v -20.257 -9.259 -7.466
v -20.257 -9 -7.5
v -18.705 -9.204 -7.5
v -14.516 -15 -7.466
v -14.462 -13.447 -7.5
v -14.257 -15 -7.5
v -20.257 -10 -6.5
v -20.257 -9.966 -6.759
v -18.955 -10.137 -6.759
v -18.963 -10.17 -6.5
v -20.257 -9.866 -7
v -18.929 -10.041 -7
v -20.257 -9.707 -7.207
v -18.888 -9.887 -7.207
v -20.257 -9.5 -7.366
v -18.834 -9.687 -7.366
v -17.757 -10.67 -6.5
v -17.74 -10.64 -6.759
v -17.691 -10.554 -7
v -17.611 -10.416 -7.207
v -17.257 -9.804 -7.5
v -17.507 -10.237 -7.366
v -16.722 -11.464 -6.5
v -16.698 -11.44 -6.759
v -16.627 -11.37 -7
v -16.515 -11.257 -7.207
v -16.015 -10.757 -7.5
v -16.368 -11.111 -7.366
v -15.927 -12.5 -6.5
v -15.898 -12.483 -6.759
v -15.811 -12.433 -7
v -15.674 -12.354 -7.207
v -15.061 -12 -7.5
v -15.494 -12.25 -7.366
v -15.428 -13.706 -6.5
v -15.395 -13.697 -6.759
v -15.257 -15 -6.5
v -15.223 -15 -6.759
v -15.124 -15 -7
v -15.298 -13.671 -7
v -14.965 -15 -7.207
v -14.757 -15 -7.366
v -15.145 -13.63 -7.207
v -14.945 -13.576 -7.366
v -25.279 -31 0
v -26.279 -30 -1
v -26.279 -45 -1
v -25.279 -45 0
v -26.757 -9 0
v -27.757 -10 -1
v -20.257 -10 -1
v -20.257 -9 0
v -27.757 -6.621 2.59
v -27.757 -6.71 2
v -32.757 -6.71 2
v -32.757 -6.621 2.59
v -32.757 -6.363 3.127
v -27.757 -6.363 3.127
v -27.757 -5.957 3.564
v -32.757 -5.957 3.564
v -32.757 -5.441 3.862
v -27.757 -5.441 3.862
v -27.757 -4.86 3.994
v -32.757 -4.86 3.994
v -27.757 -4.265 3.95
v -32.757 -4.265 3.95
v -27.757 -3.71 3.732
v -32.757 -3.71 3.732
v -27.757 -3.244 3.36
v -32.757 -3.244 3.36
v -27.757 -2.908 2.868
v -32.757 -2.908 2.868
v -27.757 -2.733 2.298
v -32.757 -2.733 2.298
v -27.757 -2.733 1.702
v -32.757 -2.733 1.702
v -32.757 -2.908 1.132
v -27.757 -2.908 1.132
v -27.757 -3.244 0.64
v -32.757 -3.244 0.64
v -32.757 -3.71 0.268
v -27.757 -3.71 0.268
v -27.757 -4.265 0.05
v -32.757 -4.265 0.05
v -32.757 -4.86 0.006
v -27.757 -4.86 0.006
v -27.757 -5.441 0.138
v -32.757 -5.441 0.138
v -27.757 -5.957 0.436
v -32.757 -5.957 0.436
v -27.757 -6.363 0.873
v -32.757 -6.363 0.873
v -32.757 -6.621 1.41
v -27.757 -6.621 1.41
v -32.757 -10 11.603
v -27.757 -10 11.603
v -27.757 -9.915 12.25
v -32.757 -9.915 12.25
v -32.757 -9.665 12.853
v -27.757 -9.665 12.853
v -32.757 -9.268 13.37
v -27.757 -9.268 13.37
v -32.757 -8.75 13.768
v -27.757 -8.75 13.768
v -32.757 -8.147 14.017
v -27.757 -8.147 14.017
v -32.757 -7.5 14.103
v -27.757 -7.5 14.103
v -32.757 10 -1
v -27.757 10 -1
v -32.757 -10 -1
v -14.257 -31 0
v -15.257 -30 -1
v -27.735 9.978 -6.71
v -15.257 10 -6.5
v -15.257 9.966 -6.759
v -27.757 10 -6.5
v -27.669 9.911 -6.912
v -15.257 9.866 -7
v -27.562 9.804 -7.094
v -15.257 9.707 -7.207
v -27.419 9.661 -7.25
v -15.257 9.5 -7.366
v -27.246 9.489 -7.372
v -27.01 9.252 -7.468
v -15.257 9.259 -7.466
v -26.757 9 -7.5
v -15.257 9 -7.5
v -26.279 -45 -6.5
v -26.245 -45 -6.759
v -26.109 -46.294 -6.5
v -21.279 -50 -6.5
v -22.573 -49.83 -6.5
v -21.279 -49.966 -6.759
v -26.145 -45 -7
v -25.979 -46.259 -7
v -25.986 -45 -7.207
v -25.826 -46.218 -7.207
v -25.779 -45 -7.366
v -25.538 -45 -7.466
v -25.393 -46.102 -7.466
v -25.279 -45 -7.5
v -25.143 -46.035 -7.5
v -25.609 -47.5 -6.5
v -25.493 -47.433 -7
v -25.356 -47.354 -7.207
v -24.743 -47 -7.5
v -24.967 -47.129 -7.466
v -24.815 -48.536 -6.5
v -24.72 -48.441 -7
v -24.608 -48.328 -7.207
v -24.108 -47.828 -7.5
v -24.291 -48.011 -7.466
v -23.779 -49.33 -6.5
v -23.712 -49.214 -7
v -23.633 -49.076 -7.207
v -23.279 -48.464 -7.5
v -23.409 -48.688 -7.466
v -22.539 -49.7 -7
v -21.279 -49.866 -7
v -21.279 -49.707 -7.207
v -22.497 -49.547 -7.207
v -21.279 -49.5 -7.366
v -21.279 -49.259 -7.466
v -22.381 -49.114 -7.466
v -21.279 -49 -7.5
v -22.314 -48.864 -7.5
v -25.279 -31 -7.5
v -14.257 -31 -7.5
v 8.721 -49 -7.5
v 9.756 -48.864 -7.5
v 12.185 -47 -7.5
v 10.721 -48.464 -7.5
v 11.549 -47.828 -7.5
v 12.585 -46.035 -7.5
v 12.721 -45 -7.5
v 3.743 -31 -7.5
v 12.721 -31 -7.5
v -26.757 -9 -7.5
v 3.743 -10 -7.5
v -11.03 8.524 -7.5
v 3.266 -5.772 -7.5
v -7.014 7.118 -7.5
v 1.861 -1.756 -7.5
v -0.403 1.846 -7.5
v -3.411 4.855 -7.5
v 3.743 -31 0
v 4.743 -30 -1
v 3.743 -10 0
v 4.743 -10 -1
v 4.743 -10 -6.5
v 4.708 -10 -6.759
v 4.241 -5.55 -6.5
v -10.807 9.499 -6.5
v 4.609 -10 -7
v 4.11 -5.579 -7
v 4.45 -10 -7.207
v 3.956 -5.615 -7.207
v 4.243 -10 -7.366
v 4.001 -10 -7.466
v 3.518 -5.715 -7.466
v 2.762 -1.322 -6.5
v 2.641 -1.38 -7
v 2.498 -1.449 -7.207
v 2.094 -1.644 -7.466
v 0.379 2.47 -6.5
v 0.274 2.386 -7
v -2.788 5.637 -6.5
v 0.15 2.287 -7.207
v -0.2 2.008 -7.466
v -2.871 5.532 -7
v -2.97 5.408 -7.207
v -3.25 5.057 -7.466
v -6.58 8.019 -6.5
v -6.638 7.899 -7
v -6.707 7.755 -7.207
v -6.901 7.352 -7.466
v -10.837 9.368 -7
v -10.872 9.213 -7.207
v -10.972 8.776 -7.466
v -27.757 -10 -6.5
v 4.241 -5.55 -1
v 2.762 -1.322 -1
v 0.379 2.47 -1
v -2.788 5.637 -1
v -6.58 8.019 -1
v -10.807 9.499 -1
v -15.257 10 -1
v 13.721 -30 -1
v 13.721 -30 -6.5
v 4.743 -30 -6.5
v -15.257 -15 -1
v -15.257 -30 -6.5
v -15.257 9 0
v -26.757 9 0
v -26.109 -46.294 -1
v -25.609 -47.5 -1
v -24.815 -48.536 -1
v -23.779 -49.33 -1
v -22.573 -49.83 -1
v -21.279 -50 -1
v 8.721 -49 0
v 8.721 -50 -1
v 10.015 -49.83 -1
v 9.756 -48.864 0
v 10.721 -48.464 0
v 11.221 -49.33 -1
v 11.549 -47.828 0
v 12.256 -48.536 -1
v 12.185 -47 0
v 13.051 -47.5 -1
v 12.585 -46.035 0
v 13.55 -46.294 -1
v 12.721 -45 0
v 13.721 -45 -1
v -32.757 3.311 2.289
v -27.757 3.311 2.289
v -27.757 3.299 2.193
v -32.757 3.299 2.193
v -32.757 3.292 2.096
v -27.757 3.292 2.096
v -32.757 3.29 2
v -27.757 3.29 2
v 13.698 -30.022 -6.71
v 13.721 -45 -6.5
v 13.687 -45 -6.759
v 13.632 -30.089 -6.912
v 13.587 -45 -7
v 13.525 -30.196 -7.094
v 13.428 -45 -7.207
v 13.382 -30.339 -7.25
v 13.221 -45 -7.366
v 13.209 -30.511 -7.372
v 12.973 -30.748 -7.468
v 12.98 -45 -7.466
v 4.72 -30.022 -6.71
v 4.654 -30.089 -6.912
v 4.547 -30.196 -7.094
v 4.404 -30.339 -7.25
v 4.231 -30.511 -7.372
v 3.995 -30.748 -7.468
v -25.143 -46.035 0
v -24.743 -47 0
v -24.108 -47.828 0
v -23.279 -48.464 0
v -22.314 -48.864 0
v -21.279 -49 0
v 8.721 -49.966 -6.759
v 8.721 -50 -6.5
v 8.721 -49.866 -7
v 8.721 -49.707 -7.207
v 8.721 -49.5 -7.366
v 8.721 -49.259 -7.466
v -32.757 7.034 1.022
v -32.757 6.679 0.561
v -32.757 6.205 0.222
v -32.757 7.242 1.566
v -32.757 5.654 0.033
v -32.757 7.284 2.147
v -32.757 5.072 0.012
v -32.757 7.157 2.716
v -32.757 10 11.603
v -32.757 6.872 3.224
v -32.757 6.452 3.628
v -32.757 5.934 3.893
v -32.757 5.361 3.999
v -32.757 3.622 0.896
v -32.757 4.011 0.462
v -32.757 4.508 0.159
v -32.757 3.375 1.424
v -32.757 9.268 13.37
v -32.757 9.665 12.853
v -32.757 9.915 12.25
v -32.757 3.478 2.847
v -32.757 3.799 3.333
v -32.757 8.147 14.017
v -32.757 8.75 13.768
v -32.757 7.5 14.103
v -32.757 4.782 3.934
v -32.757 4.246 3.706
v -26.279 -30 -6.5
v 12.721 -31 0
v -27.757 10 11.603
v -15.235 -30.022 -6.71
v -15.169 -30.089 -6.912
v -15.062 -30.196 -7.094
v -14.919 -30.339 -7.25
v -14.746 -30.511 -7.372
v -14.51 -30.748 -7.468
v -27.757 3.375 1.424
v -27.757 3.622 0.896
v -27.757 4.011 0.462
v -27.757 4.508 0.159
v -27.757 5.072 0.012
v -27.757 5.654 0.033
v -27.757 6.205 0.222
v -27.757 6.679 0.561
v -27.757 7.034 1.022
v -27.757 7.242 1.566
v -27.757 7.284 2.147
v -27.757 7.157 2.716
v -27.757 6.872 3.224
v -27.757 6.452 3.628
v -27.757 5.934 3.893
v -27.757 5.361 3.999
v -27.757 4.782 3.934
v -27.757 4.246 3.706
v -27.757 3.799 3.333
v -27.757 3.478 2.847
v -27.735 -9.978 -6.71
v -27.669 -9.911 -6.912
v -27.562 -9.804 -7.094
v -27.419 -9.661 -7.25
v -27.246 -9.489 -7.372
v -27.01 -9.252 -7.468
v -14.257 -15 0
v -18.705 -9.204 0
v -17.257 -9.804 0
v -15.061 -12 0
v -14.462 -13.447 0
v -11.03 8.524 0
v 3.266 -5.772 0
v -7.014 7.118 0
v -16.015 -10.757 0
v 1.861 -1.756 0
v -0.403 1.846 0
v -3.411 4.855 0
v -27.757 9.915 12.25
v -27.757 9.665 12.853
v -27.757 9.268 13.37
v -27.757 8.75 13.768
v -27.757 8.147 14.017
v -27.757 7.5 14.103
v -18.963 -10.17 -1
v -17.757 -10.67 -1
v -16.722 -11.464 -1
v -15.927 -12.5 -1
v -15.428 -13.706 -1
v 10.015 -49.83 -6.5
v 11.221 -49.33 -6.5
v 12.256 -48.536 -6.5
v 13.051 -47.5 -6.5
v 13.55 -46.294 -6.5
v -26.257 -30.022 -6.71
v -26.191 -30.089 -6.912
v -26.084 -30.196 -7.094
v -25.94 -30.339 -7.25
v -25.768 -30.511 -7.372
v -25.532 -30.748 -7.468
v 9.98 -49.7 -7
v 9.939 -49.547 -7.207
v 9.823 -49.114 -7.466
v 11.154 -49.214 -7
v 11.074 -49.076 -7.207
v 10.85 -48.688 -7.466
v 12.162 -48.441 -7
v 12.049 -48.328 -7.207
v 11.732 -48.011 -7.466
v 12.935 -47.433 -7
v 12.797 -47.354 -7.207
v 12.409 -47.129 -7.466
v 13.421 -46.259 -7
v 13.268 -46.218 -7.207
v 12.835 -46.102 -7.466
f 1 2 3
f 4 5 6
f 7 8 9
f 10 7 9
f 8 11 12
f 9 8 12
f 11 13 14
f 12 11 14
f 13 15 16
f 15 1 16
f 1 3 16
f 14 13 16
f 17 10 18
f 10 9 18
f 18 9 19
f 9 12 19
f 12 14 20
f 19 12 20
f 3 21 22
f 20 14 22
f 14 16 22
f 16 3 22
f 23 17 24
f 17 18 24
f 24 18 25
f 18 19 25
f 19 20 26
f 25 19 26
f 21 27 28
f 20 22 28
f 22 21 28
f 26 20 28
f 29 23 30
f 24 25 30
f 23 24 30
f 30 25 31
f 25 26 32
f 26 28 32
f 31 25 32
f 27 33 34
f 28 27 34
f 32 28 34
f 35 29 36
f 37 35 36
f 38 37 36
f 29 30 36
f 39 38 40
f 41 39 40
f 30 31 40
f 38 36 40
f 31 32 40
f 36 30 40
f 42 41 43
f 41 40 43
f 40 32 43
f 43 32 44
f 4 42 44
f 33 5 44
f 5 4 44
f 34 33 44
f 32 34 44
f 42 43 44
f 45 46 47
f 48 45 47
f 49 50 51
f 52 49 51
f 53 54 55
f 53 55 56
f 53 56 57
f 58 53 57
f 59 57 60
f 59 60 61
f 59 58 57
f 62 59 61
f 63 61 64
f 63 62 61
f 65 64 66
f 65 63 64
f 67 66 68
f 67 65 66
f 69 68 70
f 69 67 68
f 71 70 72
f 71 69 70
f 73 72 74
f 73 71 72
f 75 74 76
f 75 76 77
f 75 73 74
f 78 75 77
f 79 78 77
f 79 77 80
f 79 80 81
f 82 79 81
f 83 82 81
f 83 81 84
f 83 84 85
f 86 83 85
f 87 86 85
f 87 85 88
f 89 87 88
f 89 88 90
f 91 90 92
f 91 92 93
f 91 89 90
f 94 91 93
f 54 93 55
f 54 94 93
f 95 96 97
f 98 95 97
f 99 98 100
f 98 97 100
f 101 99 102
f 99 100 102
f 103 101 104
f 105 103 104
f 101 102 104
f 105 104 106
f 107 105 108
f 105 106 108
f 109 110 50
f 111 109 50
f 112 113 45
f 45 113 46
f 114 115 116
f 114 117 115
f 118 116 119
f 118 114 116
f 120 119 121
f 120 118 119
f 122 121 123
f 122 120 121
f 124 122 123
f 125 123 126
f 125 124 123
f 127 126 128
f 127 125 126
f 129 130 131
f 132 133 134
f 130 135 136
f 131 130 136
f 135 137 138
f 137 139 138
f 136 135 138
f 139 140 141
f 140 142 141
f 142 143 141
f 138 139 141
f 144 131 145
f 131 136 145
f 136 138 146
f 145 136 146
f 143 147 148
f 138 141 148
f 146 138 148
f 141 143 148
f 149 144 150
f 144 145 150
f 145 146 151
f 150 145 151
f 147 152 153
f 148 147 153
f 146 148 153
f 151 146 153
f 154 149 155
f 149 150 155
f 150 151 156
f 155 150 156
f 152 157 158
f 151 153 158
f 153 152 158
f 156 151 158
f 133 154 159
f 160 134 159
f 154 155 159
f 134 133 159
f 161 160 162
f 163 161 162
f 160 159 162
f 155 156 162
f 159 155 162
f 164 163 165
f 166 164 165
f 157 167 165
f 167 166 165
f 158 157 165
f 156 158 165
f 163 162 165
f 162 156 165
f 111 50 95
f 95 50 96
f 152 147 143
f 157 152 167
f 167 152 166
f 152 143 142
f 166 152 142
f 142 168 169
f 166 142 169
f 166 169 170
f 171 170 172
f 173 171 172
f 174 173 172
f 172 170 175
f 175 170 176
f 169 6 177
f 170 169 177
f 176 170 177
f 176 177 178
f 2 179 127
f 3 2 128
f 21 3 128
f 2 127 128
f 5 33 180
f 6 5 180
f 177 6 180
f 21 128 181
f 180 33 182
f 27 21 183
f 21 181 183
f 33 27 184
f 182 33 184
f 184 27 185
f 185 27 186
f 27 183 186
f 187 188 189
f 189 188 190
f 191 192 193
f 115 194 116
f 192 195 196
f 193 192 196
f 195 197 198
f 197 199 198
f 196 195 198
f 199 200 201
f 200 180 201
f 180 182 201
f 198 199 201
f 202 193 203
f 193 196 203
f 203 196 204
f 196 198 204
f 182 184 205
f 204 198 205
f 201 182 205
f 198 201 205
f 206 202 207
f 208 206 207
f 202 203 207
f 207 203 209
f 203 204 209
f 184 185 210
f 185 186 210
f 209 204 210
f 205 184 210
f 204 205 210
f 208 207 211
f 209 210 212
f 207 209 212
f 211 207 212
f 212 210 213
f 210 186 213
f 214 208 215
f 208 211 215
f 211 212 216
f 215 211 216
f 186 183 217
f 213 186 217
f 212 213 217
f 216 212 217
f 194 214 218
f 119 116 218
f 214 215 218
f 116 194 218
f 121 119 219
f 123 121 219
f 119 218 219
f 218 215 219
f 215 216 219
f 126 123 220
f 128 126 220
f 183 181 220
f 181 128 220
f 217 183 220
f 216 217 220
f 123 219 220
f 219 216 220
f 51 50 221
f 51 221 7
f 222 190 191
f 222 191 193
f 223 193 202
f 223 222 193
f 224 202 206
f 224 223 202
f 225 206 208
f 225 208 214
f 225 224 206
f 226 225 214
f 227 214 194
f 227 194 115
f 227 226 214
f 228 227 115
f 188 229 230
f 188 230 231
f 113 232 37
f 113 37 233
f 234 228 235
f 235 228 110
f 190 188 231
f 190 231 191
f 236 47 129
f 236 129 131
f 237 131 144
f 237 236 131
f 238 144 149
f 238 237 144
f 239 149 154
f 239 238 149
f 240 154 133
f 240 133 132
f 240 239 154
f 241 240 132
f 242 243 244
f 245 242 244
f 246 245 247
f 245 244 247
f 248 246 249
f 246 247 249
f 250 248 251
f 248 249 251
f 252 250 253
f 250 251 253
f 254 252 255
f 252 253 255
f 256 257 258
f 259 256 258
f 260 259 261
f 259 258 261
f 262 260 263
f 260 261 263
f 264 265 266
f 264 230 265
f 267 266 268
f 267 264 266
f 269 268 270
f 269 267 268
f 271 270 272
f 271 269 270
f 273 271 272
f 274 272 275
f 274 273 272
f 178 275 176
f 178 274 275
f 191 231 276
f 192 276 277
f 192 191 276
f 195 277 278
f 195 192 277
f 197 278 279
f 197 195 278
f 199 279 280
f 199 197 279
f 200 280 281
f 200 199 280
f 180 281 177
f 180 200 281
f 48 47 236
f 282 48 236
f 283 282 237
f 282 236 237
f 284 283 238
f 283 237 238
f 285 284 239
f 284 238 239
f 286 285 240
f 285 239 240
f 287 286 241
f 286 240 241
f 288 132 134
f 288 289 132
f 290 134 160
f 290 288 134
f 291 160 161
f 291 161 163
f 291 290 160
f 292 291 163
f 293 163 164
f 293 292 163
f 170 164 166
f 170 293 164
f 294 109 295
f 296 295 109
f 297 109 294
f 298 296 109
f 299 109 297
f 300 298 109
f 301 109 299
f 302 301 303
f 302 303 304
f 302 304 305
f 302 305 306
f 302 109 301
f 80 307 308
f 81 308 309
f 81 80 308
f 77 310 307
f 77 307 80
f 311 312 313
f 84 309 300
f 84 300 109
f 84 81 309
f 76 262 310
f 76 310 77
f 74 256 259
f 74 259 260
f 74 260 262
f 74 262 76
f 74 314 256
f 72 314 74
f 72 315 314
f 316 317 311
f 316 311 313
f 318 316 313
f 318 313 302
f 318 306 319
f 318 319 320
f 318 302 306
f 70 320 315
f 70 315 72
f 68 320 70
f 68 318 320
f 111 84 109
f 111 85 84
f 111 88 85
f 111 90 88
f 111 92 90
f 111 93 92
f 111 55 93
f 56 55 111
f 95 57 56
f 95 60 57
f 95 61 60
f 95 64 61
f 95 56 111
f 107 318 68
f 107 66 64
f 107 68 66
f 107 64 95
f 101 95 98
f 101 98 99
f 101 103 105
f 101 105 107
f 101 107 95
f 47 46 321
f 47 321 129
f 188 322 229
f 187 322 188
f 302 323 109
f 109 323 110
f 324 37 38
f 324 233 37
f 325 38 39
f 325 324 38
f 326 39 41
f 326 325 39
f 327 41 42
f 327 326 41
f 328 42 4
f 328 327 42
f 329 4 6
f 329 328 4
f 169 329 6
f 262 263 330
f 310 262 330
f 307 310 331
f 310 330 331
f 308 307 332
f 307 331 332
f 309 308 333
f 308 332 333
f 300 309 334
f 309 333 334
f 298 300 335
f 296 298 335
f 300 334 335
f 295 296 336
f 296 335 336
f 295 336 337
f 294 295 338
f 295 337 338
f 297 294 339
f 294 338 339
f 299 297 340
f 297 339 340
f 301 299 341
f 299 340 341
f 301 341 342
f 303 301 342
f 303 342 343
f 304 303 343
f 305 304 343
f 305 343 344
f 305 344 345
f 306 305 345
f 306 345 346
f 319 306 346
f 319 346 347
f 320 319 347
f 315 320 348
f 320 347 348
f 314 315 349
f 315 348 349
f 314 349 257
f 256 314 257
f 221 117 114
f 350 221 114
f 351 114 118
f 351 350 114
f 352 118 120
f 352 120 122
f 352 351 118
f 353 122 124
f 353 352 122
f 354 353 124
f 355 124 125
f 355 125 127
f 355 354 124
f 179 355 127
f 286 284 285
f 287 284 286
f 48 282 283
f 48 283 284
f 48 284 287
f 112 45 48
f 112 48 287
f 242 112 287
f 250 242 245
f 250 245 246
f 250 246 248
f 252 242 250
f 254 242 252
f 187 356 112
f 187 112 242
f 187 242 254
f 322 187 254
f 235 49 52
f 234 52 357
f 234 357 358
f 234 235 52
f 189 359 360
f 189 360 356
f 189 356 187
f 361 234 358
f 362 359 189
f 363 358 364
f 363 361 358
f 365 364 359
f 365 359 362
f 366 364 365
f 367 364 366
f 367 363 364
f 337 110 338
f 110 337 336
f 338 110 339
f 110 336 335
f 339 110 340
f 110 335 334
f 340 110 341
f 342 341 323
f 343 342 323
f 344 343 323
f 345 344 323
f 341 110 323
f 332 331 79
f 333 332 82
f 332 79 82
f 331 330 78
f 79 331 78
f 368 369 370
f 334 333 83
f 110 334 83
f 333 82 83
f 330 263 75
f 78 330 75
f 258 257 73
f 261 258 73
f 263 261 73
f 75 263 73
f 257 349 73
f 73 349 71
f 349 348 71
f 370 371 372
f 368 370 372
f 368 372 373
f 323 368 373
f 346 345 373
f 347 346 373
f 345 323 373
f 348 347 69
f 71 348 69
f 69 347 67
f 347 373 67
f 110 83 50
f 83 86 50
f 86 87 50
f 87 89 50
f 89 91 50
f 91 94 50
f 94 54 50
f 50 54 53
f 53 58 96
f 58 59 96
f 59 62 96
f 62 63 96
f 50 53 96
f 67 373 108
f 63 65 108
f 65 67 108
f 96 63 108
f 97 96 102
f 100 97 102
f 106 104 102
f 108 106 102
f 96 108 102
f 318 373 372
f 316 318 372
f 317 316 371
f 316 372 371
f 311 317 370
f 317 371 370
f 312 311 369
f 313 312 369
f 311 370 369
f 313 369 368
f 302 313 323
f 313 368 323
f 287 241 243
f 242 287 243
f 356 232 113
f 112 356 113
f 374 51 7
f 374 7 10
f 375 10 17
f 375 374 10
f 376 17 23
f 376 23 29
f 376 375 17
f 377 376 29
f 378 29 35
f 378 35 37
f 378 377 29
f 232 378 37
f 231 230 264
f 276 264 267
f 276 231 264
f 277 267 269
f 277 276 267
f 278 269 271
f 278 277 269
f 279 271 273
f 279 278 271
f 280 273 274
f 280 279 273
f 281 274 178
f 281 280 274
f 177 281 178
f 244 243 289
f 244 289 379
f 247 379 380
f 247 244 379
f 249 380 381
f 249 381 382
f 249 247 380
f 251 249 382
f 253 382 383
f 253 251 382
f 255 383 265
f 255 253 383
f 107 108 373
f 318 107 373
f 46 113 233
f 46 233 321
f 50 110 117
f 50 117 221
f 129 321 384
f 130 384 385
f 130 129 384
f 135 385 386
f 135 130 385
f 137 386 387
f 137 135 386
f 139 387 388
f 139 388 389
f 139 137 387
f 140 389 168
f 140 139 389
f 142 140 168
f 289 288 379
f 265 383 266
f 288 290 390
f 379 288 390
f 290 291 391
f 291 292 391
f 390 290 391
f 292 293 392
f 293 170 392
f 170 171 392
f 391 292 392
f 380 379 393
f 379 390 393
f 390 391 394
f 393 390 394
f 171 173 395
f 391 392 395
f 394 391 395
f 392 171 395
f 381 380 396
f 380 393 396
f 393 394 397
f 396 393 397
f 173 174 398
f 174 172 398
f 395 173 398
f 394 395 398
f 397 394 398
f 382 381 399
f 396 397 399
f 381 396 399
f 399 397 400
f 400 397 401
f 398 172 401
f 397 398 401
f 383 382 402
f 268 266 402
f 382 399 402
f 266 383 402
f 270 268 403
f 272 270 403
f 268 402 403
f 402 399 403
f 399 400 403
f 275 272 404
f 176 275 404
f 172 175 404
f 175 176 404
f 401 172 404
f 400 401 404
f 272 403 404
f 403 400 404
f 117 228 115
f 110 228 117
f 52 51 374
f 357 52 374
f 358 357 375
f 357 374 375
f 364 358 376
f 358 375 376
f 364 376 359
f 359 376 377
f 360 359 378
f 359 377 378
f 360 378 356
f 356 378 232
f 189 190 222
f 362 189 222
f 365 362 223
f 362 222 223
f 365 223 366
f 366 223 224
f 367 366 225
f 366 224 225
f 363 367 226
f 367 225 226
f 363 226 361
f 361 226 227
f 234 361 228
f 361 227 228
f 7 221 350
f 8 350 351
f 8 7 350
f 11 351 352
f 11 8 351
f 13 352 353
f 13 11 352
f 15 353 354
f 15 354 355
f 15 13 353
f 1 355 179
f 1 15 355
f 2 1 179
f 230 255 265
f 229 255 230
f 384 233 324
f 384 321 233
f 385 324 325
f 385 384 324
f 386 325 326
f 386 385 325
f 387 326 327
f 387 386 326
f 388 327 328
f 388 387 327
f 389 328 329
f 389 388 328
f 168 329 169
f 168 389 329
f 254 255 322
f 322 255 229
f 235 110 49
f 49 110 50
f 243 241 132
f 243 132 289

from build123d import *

# Parameters (mm, degrees)
F1_DEPTH = 7.5
F2_DEPTH = 2.5
F3_R     = 1
F4_SIZE  = 1
F5_R     = 2
F6_DEPTH = 5


# Not quite as in the source:
# - a feature names something its author has since deleted; it is built from what else it names


with BuildPart() as f1:
    # F0 (on Top) → F1 (new body)
    with BuildSketch(Plane.XY):
        with BuildLine():
            Line((-15.2574911714, 10), (-27.7574911714, 10))
            Line((-27.7574911714, 10), (-27.7574911714, -10))
            Line((-27.7574911714, -10), (-20.2574911714, -10))
            ThreePointArc((-20.2574911714, -10), (-16.7219572654, -11.4644660941), (-15.2574911714, -15))
            Line((-15.2574911714, -15), (-15.2574911714, -30.0000000031))
            Line((-15.2574911714, -30.0000000031), (4.7425088286, -30.0000000031))
            Line((4.7425088286, -30.0000000031), (4.7425088286, -10))
            ThreePointArc((4.7425088286, -10), (-1.1153555476, 4.1421356237), (-15.2574911714, 10))
        make_face()
        with BuildLine():
            Line((13.7208224833, -30.0000000031), (4.7425088286, -30.0000000031))
            Line((4.7425088286, -30.0000000031), (-15.2574911714, -30.0000000031))
            Line((-15.2574911714, -30.0000000031), (-26.2791775167, -30.0000000031))
            Line((-26.2791775167, -30.0000000031), (-26.2791775167, -45.0000000031))
            ThreePointArc((-26.2791775167, -45.0000000031), (-24.8147114226, -48.535533909), (-21.2791775167, -50.0000000031))
            Line((-21.2791775167, -50.0000000031), (8.7208224833, -50.0000000031))
            ThreePointArc((8.7208224833, -50.0000000031), (12.2563563892, -48.535533909), (13.7208224833, -45.0000000031))
            Line((13.7208224833, -45.0000000031), (13.7208224833, -30.0000000031))
        make_face()
    extrude(amount=-F1_DEPTH)

    # F0 (on Top) → F2 (join)
    with BuildSketch(Plane.XY):
        with BuildLine():
            Line((13.7208224833, -30.0000000031), (4.7425088286, -30.0000000031))
            Line((4.7425088286, -30.0000000031), (-15.2574911714, -30.0000000031))
            Line((-15.2574911714, -30.0000000031), (-26.2791775167, -30.0000000031))
            Line((-26.2791775167, -30.0000000031), (-26.2791775167, -45.0000000031))
            ThreePointArc((-26.2791775167, -45.0000000031), (-24.8147114226, -48.535533909), (-21.2791775167, -50.0000000031))
            Line((-21.2791775167, -50.0000000031), (8.7208224833, -50.0000000031))
            ThreePointArc((8.7208224833, -50.0000000031), (12.2563563892, -48.535533909), (13.7208224833, -45.0000000031))
            Line((13.7208224833, -45.0000000031), (13.7208224833, -30.0000000031))
        make_face()
    extrude(amount=-F2_DEPTH)

    # F3
    f3_edges = [f1.edges().sort_by_distance(p)[0] for p in [
        (-21.507491, 10, -7.5),
        (-27.757491, 0, -7.5),
        (-24.007491, -10, -7.5),
        (-16.721957, -11.464466, -7.5),
        (-15.257491, -22.5, -7.5),
        (-20.768334, -30, -7.5),
        (-26.279178, -37.5, -7.5),
        (-24.814711, -48.535534, -7.5),
        (-6.279178, -50, -7.5),
        (12.256356, -48.535534, -7.5),
        (13.720822, -37.5, -7.5),
        (9.231666, -30, -7.5),
        (4.742509, -20, -7.5),
        (-1.115356, 4.142136, -7.5),
    ]]
    fillet(f3_edges, radius=F3_R)

    # F4
    f4_edges = [f1.edges().sort_by_distance(p)[0] for p in [
        (-1.115356, 4.142136, 0),
        (-21.507491, 10, 0),
        (-27.757491, 0, 0),
        (-24.007491, -10, 0),
        (-16.721957, -11.464466, 0),
        (-15.257491, -22.5, 0),
        (-20.768334, -30, 0),
        (-26.279178, -37.5, 0),
        (-24.814711, -48.535534, 0),
        (-6.279178, -50, 0),
        (12.256356, -48.535534, 0),
        (13.720822, -37.5, 0),
        (9.231666, -30, 0),
        (4.742509, -20, 0),
    ]]
    chamfer(f4_edges, length=F4_SIZE)


with BuildPart() as f6:
    # F5 (on face) → F6 (new body)
    with BuildSketch(Plane(origin=(-27.7574911714, 0, 0), x_dir=(0, -1, 0), z_dir=(-1, 0, 0))):
        with BuildLine():
            Line((-10, 11.602570191), (-10, -1))
            Line((-10, -1), (10, -1))
            Line((10, -1), (10, 11.602570191))
            ThreePointArc((10, 11.602570191), (9.267766953, 13.370337144), (7.5, 14.102570191))
            Line((7.5, 14.102570191), (-7.5, 14.102570191))
            ThreePointArc((-7.5, 14.102570191), (-9.267766953, 13.370337144), (-10, 11.602570191))
        make_face()
        with BuildLine():
            ThreePointArc((-3.2897860792, 2), (-7.2845475439, 1.8553393662), (-3.3107127782, 2.2885634578))
            ThreePointArc((-3.3107127782, 2.2885634578), (-3.2950246145, 2.1446606338), (-3.2897860792, 2))
        make_face(mode=Mode.SUBTRACT)
        with Locations((4.7102139208, 2)):
            Circle(F5_R, mode=Mode.SUBTRACT)
    extrude(amount=F6_DEPTH)


solid = Compound([f1.part, f6.part])
